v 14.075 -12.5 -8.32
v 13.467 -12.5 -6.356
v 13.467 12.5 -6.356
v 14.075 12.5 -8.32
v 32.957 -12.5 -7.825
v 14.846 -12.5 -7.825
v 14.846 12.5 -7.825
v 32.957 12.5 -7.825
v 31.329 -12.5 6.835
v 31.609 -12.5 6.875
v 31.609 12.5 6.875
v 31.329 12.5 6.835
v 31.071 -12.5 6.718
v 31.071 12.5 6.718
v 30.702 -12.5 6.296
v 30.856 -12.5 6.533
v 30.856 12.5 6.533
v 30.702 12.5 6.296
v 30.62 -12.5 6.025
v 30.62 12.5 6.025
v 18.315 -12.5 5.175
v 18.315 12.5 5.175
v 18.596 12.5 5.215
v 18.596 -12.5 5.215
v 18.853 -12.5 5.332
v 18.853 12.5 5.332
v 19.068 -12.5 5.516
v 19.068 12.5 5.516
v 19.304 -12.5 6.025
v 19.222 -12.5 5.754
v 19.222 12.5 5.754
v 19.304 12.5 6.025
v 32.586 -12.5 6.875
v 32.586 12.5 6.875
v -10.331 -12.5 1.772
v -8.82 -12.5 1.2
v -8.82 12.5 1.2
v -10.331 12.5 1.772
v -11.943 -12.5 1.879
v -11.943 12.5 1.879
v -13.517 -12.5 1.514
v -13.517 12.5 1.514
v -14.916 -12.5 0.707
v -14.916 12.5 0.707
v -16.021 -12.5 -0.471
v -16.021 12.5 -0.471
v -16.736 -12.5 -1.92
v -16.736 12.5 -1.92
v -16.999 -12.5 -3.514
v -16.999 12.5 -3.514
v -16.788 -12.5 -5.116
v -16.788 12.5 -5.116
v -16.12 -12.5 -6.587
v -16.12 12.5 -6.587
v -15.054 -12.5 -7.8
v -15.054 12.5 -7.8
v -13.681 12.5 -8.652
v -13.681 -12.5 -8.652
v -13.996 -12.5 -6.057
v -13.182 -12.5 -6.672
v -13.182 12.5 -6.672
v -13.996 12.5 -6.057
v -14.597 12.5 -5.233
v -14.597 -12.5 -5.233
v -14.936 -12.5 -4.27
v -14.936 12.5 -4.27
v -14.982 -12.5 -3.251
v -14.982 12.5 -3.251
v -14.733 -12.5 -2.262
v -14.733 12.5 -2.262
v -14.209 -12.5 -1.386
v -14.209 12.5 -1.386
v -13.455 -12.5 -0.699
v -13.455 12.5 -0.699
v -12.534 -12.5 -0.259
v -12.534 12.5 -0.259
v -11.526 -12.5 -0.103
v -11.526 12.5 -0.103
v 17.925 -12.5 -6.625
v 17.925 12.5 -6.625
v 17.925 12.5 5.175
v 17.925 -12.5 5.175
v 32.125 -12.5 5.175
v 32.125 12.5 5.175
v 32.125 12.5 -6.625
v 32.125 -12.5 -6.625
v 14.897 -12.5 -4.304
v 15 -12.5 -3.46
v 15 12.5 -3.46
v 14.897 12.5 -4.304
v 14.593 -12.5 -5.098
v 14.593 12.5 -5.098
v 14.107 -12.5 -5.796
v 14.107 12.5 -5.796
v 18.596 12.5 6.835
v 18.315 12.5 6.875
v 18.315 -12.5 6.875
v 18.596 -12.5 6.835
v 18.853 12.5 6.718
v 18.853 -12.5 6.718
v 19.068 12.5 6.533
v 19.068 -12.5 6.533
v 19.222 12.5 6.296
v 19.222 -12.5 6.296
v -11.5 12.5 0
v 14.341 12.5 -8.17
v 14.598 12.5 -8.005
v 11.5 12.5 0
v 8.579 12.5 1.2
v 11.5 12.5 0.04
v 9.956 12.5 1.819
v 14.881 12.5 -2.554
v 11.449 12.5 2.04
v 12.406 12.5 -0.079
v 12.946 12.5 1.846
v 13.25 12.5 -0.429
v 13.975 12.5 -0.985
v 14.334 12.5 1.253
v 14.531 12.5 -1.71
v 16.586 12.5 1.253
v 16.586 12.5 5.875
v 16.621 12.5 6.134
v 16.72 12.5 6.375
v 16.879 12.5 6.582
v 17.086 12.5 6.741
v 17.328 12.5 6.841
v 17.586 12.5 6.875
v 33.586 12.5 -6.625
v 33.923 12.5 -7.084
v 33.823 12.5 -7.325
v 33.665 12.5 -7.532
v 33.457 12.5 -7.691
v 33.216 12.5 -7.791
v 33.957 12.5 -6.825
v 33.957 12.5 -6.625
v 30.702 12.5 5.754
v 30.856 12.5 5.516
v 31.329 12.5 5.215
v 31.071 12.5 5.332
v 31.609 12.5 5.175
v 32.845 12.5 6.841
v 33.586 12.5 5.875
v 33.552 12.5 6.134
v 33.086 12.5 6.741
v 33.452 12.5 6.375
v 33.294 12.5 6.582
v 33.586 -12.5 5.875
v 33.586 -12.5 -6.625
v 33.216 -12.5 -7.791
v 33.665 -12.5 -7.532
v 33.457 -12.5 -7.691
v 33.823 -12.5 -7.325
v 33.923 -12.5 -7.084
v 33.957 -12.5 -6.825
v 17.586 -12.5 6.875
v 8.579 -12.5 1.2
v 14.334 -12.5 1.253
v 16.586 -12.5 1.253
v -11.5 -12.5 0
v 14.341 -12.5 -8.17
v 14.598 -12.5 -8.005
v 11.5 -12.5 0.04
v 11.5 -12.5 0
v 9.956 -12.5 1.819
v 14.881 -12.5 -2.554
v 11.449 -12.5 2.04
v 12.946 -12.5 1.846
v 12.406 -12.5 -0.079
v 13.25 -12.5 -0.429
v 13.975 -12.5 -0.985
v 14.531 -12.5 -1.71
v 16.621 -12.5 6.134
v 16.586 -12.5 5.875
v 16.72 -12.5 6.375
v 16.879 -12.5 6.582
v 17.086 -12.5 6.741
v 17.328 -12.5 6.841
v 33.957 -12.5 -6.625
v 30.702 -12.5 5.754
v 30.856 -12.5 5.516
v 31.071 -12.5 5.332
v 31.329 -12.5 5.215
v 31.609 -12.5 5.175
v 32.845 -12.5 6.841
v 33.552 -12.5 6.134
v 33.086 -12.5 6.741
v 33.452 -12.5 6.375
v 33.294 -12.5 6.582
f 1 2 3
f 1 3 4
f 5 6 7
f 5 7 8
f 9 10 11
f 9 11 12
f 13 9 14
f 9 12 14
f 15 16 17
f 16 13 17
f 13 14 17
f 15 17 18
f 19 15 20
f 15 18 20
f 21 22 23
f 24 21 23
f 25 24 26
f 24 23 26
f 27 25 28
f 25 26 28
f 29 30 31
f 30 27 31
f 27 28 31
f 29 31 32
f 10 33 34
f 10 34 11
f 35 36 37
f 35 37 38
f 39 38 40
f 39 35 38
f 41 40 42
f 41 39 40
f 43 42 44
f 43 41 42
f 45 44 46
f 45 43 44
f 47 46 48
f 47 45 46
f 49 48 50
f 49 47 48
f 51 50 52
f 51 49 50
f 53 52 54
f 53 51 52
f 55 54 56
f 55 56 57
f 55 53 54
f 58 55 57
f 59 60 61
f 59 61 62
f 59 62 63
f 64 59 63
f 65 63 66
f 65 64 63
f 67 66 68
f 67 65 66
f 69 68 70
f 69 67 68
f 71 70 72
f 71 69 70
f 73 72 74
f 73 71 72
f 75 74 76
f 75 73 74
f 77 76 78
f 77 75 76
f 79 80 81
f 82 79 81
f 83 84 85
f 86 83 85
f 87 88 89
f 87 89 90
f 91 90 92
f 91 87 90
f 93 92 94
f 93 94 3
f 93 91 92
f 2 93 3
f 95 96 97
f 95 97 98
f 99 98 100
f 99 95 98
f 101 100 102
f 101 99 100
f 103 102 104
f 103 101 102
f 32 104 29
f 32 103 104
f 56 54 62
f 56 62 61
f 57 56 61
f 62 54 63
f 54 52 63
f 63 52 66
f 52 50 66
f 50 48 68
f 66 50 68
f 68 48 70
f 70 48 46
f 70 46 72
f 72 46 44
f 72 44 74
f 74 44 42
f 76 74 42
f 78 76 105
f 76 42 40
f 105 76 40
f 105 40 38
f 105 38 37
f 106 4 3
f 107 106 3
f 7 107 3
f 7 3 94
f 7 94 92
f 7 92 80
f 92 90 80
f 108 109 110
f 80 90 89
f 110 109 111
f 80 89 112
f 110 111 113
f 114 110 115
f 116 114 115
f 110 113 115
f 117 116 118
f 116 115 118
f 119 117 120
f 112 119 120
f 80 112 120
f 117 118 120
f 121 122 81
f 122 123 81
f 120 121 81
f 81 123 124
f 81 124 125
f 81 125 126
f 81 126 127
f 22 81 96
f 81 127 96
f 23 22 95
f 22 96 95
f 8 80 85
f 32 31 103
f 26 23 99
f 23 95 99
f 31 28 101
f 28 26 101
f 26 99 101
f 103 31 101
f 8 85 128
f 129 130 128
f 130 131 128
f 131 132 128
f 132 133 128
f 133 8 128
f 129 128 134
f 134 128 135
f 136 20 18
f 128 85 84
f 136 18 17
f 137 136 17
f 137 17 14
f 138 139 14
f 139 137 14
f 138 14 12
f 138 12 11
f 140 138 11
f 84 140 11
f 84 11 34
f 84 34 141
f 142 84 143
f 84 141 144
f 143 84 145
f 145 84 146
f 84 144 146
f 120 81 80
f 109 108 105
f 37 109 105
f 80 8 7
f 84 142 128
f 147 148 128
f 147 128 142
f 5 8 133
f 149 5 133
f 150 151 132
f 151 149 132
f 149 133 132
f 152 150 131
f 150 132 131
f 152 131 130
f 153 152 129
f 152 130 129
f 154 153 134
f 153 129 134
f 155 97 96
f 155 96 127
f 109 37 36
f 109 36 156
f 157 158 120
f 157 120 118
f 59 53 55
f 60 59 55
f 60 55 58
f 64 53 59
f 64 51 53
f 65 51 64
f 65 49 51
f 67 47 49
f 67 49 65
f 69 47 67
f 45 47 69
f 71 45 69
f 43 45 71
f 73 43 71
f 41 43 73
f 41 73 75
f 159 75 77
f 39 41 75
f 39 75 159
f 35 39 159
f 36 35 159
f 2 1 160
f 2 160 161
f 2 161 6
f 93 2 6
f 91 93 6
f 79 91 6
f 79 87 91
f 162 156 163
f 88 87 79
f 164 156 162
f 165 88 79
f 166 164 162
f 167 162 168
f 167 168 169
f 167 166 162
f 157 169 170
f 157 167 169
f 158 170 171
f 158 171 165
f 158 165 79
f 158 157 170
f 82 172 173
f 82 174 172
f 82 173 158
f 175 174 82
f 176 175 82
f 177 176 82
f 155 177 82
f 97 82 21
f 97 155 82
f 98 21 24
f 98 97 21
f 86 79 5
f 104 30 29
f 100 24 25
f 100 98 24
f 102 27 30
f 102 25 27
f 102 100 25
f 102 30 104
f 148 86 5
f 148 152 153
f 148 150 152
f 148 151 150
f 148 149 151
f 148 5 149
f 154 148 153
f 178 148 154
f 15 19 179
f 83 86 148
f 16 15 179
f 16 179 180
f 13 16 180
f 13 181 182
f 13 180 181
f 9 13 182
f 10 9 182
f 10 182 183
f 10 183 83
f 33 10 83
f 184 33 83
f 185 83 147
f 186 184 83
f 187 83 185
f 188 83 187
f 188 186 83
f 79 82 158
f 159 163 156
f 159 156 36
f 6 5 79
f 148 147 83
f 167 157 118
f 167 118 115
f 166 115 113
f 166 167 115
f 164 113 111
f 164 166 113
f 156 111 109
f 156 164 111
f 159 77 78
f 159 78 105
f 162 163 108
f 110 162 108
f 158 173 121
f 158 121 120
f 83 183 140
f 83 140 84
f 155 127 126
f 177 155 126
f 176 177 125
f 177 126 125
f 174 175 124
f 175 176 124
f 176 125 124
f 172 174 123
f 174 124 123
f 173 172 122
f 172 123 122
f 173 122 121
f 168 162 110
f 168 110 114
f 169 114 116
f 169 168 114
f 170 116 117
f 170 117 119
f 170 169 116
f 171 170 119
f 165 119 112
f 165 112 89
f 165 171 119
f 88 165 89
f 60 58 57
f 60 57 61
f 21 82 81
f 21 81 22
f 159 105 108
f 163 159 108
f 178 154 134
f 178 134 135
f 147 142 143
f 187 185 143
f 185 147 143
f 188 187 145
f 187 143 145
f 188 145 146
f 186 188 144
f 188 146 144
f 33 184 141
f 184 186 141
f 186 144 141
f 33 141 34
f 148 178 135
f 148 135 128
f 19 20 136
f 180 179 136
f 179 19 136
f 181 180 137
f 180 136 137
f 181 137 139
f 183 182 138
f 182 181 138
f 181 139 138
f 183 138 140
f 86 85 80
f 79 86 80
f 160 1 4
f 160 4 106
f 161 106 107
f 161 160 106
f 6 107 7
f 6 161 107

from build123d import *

# Parameters (mm, degrees)
F0_W        = 23
F0_H        = 25
F1_DEPTH    = 1.2
F3_DEPTH    = 25
F5_W        = 1.3906080276
F5_H        = 1.7
F5_W_2      = 1.5159434646
F6_DEPTH    = 25
F7_T1_DEPTH = 30


# Not quite as in the source:
# - a fillet or chamfer that OpenCascade refuses, or shapes differently, is made with other operations: its cross-section is extruded or revolved along the edge and cut away or added


with BuildPart() as f1:
    # F0 (on Top) → F1 (new body)
    with BuildSketch(Plane.XY):
        Rectangle(F0_W, F0_H)
    extrude(amount=F1_DEPTH)

    # F2 (on face) → F3 (join)
    with BuildSketch(Plane.XZ.offset(12.5)):
        with BuildLine():
            ThreePointArc((-8.8198933508, 1.2), (-16.4322899898, -1.1691927474), (-13.6809007153, -8.6519404997))
            Line((-13.6809007153, -8.6519404997), (-13.1818733439, -6.6722285874))
            ThreePointArc((-13.1818733439, -6.6722285874), (-14.8938387487, -2.747327312), (-11.5259407878, -0.1029107612))
            Line((-11.5259407878, -0.1029107612), (-11.5, 0))
            Line((-11.5, 0), (-11.5, 1.2))
            Line((-11.5, 1.2), (-8.8198933508, 1.2))
        make_face()
        with BuildLine():
            ThreePointArc((17, -3.4602172673), (14.1631160155, 1.3520392811), (8.578977059, 1.2))
            Line((8.578977059, 1.2), (11.5, 1.2))
            Line((11.5, 1.2), (11.5, 0.0397827327))
            ThreePointArc((11.5, 0.0397827327), (13.9748737342, -0.9853435331), (15, -3.4602172673))
            ThreePointArc((15, -3.4602172673), (14.5929628971, -5.0983810311), (13.4665254188, -6.3555199764))
            Line((13.4665254188, -6.3555199764), (14.0745145934, -8.3204512748))
            ThreePointArc((14.0745145934, -8.3204512748), (16.2122091562, -6.2966031487), (17, -3.4602172673))
        make_face()
    extrude(amount=-F3_DEPTH)

    # F5 (on face) → F6 (join)
    with BuildSketch(Plane.XZ.offset(12.5)):
        with Locations((18.6200318858, 6.0247716144)):
            Rectangle(F5_W, F5_H)
        with BuildLine():
            ThreePointArc((16.5864266455, -1.367787106), (17, -3.4602172673), (16.5864266455, -5.5526474285))
            Line((16.5864266455, -5.5526474285), (16.5864266455, -6.6252283856))
            Line((16.5864266455, -6.6252283856), (17.924727872, -6.6252283856))
            Line((17.924727872, -6.6252283856), (17.924727872, 5.1747716144))
            Line((17.924727872, 5.1747716144), (17.924727872, 6.8747716144))
            Line((17.924727872, 6.8747716144), (16.5864266455, 6.8747716144))
            Line((16.5864266455, 6.8747716144), (16.5864266455, 1.253477479))
            Line((16.5864266455, 1.253477479), (16.5864266455, -1.367787106))
        make_face()
        Polygon((32.124727872, -6.6252283856), (33.5864266455, -6.6252283856), (33.5864266455, 6.8747716144), (32.124727872, 6.8747716144), (32.124727872, 5.1747716144), align=None)
        with Locations((31.3667561397, 6.0247716144)):
            Rectangle(F5_W_2, F5_H)
        with BuildLine():
            Line((14.8461437412, -7.8252283856), (16.5864266455, -7.8252283856))
            Line((16.5864266455, -7.8252283856), (33.9574068785, -7.8252283856))
            Line((33.9574068785, -7.8252283856), (33.9574068785, -6.6252283856))
            Line((33.9574068785, -6.6252283856), (33.5864266455, -6.6252283856))
            Line((33.5864266455, -6.6252283856), (32.124727872, -6.6252283856))
            Line((32.124727872, -6.6252283856), (17.924727872, -6.6252283856))
            Line((17.924727872, -6.6252283856), (16.5864266455, -6.6252283856))
            Line((16.5864266455, -6.6252283856), (16.5864266455, -5.5526474285))
            ThreePointArc((16.5864266455, -5.5526474285), (15.8667169456, -6.8041345983), (14.8461437412, -7.8252283856))
        make_face()
        with BuildLine():
            ThreePointArc((14.333916343, 1.253477479), (15.6714164585, 0.1243726298), (16.5864266455, -1.367787106))
            Line((16.5864266455, -1.367787106), (16.5864266455, 1.253477479))
            Line((16.5864266455, 1.253477479), (14.333916343, 1.253477479))
        make_face()
    extrude(amount=-F6_DEPTH)

    # F7: fillet of radius 1 on 7 edges, made by hand

    # F7_s2 → F7_t1 (cut)
    with BuildSketch(Plane.XZ.offset(-15)):
        with BuildLine():
            ThreePointArc((33.5864266455, 5.8747716144), (33.2935334267, 6.5818783956), (32.5864266455, 6.8747716144))
            Line((32.5864266455, 6.8747716144), (33.5864266455, 6.8747716144))
            Line((33.5864266455, 6.8747716144), (33.5864266455, 5.8747716144))
        make_face()
        with BuildLine():
            ThreePointArc((17.5864266455, 6.8747716144), (16.8793198643, 6.5818783956), (16.5864266455, 5.8747716144))
            Line((16.5864266455, 5.8747716144), (16.5864266455, 6.8747716144))
            Line((16.5864266455, 6.8747716144), (17.5864266455, 6.8747716144))
        make_face()
        with BuildLine():
            ThreePointArc((18.3153358996, 5.1747716144), (19.0224426808, 5.4676648332), (19.3153358996, 6.1747716144))
            Line((19.3153358996, 6.1747716144), (19.3153358996, 5.1747716144))
            Line((19.3153358996, 5.1747716144), (18.3153358996, 5.1747716144))
        make_face()
        with BuildLine():
            ThreePointArc((30.6087844074, 6.1747716144), (30.9016776262, 5.4676648332), (31.6087844074, 5.1747716144))
            Line((31.6087844074, 5.1747716144), (30.6087844074, 5.1747716144))
            Line((30.6087844074, 5.1747716144), (30.6087844074, 6.1747716144))
        make_face()
        with BuildLine():
            ThreePointArc((31.6087844074, 6.8747716144), (30.9016776262, 6.5818783956), (30.6087844074, 5.8747716144))
            Line((30.6087844074, 5.8747716144), (30.6087844074, 6.8747716144))
            Line((30.6087844074, 6.8747716144), (31.6087844074, 6.8747716144))
        make_face()
        with BuildLine():
            ThreePointArc((18.3153358996, 6.8747716144), (19.0224426808, 6.5818783956), (19.3153358996, 5.8747716144))
            Line((19.3153358996, 5.8747716144), (19.3153358996, 6.8747716144))
            Line((19.3153358996, 6.8747716144), (18.3153358996, 6.8747716144))
        make_face()
        with BuildLine():
            ThreePointArc((32.9574068785, -7.8252283856), (33.6645136597, -7.5323351668), (33.9574068785, -6.8252283856))
            Line((33.9574068785, -6.8252283856), (33.9574068785, -7.8252283856))
            Line((33.9574068785, -7.8252283856), (32.9574068785, -7.8252283856))
        make_face()
    extrude(amount=F7_T1_DEPTH, mode=Mode.SUBTRACT)


solid = f1.part
